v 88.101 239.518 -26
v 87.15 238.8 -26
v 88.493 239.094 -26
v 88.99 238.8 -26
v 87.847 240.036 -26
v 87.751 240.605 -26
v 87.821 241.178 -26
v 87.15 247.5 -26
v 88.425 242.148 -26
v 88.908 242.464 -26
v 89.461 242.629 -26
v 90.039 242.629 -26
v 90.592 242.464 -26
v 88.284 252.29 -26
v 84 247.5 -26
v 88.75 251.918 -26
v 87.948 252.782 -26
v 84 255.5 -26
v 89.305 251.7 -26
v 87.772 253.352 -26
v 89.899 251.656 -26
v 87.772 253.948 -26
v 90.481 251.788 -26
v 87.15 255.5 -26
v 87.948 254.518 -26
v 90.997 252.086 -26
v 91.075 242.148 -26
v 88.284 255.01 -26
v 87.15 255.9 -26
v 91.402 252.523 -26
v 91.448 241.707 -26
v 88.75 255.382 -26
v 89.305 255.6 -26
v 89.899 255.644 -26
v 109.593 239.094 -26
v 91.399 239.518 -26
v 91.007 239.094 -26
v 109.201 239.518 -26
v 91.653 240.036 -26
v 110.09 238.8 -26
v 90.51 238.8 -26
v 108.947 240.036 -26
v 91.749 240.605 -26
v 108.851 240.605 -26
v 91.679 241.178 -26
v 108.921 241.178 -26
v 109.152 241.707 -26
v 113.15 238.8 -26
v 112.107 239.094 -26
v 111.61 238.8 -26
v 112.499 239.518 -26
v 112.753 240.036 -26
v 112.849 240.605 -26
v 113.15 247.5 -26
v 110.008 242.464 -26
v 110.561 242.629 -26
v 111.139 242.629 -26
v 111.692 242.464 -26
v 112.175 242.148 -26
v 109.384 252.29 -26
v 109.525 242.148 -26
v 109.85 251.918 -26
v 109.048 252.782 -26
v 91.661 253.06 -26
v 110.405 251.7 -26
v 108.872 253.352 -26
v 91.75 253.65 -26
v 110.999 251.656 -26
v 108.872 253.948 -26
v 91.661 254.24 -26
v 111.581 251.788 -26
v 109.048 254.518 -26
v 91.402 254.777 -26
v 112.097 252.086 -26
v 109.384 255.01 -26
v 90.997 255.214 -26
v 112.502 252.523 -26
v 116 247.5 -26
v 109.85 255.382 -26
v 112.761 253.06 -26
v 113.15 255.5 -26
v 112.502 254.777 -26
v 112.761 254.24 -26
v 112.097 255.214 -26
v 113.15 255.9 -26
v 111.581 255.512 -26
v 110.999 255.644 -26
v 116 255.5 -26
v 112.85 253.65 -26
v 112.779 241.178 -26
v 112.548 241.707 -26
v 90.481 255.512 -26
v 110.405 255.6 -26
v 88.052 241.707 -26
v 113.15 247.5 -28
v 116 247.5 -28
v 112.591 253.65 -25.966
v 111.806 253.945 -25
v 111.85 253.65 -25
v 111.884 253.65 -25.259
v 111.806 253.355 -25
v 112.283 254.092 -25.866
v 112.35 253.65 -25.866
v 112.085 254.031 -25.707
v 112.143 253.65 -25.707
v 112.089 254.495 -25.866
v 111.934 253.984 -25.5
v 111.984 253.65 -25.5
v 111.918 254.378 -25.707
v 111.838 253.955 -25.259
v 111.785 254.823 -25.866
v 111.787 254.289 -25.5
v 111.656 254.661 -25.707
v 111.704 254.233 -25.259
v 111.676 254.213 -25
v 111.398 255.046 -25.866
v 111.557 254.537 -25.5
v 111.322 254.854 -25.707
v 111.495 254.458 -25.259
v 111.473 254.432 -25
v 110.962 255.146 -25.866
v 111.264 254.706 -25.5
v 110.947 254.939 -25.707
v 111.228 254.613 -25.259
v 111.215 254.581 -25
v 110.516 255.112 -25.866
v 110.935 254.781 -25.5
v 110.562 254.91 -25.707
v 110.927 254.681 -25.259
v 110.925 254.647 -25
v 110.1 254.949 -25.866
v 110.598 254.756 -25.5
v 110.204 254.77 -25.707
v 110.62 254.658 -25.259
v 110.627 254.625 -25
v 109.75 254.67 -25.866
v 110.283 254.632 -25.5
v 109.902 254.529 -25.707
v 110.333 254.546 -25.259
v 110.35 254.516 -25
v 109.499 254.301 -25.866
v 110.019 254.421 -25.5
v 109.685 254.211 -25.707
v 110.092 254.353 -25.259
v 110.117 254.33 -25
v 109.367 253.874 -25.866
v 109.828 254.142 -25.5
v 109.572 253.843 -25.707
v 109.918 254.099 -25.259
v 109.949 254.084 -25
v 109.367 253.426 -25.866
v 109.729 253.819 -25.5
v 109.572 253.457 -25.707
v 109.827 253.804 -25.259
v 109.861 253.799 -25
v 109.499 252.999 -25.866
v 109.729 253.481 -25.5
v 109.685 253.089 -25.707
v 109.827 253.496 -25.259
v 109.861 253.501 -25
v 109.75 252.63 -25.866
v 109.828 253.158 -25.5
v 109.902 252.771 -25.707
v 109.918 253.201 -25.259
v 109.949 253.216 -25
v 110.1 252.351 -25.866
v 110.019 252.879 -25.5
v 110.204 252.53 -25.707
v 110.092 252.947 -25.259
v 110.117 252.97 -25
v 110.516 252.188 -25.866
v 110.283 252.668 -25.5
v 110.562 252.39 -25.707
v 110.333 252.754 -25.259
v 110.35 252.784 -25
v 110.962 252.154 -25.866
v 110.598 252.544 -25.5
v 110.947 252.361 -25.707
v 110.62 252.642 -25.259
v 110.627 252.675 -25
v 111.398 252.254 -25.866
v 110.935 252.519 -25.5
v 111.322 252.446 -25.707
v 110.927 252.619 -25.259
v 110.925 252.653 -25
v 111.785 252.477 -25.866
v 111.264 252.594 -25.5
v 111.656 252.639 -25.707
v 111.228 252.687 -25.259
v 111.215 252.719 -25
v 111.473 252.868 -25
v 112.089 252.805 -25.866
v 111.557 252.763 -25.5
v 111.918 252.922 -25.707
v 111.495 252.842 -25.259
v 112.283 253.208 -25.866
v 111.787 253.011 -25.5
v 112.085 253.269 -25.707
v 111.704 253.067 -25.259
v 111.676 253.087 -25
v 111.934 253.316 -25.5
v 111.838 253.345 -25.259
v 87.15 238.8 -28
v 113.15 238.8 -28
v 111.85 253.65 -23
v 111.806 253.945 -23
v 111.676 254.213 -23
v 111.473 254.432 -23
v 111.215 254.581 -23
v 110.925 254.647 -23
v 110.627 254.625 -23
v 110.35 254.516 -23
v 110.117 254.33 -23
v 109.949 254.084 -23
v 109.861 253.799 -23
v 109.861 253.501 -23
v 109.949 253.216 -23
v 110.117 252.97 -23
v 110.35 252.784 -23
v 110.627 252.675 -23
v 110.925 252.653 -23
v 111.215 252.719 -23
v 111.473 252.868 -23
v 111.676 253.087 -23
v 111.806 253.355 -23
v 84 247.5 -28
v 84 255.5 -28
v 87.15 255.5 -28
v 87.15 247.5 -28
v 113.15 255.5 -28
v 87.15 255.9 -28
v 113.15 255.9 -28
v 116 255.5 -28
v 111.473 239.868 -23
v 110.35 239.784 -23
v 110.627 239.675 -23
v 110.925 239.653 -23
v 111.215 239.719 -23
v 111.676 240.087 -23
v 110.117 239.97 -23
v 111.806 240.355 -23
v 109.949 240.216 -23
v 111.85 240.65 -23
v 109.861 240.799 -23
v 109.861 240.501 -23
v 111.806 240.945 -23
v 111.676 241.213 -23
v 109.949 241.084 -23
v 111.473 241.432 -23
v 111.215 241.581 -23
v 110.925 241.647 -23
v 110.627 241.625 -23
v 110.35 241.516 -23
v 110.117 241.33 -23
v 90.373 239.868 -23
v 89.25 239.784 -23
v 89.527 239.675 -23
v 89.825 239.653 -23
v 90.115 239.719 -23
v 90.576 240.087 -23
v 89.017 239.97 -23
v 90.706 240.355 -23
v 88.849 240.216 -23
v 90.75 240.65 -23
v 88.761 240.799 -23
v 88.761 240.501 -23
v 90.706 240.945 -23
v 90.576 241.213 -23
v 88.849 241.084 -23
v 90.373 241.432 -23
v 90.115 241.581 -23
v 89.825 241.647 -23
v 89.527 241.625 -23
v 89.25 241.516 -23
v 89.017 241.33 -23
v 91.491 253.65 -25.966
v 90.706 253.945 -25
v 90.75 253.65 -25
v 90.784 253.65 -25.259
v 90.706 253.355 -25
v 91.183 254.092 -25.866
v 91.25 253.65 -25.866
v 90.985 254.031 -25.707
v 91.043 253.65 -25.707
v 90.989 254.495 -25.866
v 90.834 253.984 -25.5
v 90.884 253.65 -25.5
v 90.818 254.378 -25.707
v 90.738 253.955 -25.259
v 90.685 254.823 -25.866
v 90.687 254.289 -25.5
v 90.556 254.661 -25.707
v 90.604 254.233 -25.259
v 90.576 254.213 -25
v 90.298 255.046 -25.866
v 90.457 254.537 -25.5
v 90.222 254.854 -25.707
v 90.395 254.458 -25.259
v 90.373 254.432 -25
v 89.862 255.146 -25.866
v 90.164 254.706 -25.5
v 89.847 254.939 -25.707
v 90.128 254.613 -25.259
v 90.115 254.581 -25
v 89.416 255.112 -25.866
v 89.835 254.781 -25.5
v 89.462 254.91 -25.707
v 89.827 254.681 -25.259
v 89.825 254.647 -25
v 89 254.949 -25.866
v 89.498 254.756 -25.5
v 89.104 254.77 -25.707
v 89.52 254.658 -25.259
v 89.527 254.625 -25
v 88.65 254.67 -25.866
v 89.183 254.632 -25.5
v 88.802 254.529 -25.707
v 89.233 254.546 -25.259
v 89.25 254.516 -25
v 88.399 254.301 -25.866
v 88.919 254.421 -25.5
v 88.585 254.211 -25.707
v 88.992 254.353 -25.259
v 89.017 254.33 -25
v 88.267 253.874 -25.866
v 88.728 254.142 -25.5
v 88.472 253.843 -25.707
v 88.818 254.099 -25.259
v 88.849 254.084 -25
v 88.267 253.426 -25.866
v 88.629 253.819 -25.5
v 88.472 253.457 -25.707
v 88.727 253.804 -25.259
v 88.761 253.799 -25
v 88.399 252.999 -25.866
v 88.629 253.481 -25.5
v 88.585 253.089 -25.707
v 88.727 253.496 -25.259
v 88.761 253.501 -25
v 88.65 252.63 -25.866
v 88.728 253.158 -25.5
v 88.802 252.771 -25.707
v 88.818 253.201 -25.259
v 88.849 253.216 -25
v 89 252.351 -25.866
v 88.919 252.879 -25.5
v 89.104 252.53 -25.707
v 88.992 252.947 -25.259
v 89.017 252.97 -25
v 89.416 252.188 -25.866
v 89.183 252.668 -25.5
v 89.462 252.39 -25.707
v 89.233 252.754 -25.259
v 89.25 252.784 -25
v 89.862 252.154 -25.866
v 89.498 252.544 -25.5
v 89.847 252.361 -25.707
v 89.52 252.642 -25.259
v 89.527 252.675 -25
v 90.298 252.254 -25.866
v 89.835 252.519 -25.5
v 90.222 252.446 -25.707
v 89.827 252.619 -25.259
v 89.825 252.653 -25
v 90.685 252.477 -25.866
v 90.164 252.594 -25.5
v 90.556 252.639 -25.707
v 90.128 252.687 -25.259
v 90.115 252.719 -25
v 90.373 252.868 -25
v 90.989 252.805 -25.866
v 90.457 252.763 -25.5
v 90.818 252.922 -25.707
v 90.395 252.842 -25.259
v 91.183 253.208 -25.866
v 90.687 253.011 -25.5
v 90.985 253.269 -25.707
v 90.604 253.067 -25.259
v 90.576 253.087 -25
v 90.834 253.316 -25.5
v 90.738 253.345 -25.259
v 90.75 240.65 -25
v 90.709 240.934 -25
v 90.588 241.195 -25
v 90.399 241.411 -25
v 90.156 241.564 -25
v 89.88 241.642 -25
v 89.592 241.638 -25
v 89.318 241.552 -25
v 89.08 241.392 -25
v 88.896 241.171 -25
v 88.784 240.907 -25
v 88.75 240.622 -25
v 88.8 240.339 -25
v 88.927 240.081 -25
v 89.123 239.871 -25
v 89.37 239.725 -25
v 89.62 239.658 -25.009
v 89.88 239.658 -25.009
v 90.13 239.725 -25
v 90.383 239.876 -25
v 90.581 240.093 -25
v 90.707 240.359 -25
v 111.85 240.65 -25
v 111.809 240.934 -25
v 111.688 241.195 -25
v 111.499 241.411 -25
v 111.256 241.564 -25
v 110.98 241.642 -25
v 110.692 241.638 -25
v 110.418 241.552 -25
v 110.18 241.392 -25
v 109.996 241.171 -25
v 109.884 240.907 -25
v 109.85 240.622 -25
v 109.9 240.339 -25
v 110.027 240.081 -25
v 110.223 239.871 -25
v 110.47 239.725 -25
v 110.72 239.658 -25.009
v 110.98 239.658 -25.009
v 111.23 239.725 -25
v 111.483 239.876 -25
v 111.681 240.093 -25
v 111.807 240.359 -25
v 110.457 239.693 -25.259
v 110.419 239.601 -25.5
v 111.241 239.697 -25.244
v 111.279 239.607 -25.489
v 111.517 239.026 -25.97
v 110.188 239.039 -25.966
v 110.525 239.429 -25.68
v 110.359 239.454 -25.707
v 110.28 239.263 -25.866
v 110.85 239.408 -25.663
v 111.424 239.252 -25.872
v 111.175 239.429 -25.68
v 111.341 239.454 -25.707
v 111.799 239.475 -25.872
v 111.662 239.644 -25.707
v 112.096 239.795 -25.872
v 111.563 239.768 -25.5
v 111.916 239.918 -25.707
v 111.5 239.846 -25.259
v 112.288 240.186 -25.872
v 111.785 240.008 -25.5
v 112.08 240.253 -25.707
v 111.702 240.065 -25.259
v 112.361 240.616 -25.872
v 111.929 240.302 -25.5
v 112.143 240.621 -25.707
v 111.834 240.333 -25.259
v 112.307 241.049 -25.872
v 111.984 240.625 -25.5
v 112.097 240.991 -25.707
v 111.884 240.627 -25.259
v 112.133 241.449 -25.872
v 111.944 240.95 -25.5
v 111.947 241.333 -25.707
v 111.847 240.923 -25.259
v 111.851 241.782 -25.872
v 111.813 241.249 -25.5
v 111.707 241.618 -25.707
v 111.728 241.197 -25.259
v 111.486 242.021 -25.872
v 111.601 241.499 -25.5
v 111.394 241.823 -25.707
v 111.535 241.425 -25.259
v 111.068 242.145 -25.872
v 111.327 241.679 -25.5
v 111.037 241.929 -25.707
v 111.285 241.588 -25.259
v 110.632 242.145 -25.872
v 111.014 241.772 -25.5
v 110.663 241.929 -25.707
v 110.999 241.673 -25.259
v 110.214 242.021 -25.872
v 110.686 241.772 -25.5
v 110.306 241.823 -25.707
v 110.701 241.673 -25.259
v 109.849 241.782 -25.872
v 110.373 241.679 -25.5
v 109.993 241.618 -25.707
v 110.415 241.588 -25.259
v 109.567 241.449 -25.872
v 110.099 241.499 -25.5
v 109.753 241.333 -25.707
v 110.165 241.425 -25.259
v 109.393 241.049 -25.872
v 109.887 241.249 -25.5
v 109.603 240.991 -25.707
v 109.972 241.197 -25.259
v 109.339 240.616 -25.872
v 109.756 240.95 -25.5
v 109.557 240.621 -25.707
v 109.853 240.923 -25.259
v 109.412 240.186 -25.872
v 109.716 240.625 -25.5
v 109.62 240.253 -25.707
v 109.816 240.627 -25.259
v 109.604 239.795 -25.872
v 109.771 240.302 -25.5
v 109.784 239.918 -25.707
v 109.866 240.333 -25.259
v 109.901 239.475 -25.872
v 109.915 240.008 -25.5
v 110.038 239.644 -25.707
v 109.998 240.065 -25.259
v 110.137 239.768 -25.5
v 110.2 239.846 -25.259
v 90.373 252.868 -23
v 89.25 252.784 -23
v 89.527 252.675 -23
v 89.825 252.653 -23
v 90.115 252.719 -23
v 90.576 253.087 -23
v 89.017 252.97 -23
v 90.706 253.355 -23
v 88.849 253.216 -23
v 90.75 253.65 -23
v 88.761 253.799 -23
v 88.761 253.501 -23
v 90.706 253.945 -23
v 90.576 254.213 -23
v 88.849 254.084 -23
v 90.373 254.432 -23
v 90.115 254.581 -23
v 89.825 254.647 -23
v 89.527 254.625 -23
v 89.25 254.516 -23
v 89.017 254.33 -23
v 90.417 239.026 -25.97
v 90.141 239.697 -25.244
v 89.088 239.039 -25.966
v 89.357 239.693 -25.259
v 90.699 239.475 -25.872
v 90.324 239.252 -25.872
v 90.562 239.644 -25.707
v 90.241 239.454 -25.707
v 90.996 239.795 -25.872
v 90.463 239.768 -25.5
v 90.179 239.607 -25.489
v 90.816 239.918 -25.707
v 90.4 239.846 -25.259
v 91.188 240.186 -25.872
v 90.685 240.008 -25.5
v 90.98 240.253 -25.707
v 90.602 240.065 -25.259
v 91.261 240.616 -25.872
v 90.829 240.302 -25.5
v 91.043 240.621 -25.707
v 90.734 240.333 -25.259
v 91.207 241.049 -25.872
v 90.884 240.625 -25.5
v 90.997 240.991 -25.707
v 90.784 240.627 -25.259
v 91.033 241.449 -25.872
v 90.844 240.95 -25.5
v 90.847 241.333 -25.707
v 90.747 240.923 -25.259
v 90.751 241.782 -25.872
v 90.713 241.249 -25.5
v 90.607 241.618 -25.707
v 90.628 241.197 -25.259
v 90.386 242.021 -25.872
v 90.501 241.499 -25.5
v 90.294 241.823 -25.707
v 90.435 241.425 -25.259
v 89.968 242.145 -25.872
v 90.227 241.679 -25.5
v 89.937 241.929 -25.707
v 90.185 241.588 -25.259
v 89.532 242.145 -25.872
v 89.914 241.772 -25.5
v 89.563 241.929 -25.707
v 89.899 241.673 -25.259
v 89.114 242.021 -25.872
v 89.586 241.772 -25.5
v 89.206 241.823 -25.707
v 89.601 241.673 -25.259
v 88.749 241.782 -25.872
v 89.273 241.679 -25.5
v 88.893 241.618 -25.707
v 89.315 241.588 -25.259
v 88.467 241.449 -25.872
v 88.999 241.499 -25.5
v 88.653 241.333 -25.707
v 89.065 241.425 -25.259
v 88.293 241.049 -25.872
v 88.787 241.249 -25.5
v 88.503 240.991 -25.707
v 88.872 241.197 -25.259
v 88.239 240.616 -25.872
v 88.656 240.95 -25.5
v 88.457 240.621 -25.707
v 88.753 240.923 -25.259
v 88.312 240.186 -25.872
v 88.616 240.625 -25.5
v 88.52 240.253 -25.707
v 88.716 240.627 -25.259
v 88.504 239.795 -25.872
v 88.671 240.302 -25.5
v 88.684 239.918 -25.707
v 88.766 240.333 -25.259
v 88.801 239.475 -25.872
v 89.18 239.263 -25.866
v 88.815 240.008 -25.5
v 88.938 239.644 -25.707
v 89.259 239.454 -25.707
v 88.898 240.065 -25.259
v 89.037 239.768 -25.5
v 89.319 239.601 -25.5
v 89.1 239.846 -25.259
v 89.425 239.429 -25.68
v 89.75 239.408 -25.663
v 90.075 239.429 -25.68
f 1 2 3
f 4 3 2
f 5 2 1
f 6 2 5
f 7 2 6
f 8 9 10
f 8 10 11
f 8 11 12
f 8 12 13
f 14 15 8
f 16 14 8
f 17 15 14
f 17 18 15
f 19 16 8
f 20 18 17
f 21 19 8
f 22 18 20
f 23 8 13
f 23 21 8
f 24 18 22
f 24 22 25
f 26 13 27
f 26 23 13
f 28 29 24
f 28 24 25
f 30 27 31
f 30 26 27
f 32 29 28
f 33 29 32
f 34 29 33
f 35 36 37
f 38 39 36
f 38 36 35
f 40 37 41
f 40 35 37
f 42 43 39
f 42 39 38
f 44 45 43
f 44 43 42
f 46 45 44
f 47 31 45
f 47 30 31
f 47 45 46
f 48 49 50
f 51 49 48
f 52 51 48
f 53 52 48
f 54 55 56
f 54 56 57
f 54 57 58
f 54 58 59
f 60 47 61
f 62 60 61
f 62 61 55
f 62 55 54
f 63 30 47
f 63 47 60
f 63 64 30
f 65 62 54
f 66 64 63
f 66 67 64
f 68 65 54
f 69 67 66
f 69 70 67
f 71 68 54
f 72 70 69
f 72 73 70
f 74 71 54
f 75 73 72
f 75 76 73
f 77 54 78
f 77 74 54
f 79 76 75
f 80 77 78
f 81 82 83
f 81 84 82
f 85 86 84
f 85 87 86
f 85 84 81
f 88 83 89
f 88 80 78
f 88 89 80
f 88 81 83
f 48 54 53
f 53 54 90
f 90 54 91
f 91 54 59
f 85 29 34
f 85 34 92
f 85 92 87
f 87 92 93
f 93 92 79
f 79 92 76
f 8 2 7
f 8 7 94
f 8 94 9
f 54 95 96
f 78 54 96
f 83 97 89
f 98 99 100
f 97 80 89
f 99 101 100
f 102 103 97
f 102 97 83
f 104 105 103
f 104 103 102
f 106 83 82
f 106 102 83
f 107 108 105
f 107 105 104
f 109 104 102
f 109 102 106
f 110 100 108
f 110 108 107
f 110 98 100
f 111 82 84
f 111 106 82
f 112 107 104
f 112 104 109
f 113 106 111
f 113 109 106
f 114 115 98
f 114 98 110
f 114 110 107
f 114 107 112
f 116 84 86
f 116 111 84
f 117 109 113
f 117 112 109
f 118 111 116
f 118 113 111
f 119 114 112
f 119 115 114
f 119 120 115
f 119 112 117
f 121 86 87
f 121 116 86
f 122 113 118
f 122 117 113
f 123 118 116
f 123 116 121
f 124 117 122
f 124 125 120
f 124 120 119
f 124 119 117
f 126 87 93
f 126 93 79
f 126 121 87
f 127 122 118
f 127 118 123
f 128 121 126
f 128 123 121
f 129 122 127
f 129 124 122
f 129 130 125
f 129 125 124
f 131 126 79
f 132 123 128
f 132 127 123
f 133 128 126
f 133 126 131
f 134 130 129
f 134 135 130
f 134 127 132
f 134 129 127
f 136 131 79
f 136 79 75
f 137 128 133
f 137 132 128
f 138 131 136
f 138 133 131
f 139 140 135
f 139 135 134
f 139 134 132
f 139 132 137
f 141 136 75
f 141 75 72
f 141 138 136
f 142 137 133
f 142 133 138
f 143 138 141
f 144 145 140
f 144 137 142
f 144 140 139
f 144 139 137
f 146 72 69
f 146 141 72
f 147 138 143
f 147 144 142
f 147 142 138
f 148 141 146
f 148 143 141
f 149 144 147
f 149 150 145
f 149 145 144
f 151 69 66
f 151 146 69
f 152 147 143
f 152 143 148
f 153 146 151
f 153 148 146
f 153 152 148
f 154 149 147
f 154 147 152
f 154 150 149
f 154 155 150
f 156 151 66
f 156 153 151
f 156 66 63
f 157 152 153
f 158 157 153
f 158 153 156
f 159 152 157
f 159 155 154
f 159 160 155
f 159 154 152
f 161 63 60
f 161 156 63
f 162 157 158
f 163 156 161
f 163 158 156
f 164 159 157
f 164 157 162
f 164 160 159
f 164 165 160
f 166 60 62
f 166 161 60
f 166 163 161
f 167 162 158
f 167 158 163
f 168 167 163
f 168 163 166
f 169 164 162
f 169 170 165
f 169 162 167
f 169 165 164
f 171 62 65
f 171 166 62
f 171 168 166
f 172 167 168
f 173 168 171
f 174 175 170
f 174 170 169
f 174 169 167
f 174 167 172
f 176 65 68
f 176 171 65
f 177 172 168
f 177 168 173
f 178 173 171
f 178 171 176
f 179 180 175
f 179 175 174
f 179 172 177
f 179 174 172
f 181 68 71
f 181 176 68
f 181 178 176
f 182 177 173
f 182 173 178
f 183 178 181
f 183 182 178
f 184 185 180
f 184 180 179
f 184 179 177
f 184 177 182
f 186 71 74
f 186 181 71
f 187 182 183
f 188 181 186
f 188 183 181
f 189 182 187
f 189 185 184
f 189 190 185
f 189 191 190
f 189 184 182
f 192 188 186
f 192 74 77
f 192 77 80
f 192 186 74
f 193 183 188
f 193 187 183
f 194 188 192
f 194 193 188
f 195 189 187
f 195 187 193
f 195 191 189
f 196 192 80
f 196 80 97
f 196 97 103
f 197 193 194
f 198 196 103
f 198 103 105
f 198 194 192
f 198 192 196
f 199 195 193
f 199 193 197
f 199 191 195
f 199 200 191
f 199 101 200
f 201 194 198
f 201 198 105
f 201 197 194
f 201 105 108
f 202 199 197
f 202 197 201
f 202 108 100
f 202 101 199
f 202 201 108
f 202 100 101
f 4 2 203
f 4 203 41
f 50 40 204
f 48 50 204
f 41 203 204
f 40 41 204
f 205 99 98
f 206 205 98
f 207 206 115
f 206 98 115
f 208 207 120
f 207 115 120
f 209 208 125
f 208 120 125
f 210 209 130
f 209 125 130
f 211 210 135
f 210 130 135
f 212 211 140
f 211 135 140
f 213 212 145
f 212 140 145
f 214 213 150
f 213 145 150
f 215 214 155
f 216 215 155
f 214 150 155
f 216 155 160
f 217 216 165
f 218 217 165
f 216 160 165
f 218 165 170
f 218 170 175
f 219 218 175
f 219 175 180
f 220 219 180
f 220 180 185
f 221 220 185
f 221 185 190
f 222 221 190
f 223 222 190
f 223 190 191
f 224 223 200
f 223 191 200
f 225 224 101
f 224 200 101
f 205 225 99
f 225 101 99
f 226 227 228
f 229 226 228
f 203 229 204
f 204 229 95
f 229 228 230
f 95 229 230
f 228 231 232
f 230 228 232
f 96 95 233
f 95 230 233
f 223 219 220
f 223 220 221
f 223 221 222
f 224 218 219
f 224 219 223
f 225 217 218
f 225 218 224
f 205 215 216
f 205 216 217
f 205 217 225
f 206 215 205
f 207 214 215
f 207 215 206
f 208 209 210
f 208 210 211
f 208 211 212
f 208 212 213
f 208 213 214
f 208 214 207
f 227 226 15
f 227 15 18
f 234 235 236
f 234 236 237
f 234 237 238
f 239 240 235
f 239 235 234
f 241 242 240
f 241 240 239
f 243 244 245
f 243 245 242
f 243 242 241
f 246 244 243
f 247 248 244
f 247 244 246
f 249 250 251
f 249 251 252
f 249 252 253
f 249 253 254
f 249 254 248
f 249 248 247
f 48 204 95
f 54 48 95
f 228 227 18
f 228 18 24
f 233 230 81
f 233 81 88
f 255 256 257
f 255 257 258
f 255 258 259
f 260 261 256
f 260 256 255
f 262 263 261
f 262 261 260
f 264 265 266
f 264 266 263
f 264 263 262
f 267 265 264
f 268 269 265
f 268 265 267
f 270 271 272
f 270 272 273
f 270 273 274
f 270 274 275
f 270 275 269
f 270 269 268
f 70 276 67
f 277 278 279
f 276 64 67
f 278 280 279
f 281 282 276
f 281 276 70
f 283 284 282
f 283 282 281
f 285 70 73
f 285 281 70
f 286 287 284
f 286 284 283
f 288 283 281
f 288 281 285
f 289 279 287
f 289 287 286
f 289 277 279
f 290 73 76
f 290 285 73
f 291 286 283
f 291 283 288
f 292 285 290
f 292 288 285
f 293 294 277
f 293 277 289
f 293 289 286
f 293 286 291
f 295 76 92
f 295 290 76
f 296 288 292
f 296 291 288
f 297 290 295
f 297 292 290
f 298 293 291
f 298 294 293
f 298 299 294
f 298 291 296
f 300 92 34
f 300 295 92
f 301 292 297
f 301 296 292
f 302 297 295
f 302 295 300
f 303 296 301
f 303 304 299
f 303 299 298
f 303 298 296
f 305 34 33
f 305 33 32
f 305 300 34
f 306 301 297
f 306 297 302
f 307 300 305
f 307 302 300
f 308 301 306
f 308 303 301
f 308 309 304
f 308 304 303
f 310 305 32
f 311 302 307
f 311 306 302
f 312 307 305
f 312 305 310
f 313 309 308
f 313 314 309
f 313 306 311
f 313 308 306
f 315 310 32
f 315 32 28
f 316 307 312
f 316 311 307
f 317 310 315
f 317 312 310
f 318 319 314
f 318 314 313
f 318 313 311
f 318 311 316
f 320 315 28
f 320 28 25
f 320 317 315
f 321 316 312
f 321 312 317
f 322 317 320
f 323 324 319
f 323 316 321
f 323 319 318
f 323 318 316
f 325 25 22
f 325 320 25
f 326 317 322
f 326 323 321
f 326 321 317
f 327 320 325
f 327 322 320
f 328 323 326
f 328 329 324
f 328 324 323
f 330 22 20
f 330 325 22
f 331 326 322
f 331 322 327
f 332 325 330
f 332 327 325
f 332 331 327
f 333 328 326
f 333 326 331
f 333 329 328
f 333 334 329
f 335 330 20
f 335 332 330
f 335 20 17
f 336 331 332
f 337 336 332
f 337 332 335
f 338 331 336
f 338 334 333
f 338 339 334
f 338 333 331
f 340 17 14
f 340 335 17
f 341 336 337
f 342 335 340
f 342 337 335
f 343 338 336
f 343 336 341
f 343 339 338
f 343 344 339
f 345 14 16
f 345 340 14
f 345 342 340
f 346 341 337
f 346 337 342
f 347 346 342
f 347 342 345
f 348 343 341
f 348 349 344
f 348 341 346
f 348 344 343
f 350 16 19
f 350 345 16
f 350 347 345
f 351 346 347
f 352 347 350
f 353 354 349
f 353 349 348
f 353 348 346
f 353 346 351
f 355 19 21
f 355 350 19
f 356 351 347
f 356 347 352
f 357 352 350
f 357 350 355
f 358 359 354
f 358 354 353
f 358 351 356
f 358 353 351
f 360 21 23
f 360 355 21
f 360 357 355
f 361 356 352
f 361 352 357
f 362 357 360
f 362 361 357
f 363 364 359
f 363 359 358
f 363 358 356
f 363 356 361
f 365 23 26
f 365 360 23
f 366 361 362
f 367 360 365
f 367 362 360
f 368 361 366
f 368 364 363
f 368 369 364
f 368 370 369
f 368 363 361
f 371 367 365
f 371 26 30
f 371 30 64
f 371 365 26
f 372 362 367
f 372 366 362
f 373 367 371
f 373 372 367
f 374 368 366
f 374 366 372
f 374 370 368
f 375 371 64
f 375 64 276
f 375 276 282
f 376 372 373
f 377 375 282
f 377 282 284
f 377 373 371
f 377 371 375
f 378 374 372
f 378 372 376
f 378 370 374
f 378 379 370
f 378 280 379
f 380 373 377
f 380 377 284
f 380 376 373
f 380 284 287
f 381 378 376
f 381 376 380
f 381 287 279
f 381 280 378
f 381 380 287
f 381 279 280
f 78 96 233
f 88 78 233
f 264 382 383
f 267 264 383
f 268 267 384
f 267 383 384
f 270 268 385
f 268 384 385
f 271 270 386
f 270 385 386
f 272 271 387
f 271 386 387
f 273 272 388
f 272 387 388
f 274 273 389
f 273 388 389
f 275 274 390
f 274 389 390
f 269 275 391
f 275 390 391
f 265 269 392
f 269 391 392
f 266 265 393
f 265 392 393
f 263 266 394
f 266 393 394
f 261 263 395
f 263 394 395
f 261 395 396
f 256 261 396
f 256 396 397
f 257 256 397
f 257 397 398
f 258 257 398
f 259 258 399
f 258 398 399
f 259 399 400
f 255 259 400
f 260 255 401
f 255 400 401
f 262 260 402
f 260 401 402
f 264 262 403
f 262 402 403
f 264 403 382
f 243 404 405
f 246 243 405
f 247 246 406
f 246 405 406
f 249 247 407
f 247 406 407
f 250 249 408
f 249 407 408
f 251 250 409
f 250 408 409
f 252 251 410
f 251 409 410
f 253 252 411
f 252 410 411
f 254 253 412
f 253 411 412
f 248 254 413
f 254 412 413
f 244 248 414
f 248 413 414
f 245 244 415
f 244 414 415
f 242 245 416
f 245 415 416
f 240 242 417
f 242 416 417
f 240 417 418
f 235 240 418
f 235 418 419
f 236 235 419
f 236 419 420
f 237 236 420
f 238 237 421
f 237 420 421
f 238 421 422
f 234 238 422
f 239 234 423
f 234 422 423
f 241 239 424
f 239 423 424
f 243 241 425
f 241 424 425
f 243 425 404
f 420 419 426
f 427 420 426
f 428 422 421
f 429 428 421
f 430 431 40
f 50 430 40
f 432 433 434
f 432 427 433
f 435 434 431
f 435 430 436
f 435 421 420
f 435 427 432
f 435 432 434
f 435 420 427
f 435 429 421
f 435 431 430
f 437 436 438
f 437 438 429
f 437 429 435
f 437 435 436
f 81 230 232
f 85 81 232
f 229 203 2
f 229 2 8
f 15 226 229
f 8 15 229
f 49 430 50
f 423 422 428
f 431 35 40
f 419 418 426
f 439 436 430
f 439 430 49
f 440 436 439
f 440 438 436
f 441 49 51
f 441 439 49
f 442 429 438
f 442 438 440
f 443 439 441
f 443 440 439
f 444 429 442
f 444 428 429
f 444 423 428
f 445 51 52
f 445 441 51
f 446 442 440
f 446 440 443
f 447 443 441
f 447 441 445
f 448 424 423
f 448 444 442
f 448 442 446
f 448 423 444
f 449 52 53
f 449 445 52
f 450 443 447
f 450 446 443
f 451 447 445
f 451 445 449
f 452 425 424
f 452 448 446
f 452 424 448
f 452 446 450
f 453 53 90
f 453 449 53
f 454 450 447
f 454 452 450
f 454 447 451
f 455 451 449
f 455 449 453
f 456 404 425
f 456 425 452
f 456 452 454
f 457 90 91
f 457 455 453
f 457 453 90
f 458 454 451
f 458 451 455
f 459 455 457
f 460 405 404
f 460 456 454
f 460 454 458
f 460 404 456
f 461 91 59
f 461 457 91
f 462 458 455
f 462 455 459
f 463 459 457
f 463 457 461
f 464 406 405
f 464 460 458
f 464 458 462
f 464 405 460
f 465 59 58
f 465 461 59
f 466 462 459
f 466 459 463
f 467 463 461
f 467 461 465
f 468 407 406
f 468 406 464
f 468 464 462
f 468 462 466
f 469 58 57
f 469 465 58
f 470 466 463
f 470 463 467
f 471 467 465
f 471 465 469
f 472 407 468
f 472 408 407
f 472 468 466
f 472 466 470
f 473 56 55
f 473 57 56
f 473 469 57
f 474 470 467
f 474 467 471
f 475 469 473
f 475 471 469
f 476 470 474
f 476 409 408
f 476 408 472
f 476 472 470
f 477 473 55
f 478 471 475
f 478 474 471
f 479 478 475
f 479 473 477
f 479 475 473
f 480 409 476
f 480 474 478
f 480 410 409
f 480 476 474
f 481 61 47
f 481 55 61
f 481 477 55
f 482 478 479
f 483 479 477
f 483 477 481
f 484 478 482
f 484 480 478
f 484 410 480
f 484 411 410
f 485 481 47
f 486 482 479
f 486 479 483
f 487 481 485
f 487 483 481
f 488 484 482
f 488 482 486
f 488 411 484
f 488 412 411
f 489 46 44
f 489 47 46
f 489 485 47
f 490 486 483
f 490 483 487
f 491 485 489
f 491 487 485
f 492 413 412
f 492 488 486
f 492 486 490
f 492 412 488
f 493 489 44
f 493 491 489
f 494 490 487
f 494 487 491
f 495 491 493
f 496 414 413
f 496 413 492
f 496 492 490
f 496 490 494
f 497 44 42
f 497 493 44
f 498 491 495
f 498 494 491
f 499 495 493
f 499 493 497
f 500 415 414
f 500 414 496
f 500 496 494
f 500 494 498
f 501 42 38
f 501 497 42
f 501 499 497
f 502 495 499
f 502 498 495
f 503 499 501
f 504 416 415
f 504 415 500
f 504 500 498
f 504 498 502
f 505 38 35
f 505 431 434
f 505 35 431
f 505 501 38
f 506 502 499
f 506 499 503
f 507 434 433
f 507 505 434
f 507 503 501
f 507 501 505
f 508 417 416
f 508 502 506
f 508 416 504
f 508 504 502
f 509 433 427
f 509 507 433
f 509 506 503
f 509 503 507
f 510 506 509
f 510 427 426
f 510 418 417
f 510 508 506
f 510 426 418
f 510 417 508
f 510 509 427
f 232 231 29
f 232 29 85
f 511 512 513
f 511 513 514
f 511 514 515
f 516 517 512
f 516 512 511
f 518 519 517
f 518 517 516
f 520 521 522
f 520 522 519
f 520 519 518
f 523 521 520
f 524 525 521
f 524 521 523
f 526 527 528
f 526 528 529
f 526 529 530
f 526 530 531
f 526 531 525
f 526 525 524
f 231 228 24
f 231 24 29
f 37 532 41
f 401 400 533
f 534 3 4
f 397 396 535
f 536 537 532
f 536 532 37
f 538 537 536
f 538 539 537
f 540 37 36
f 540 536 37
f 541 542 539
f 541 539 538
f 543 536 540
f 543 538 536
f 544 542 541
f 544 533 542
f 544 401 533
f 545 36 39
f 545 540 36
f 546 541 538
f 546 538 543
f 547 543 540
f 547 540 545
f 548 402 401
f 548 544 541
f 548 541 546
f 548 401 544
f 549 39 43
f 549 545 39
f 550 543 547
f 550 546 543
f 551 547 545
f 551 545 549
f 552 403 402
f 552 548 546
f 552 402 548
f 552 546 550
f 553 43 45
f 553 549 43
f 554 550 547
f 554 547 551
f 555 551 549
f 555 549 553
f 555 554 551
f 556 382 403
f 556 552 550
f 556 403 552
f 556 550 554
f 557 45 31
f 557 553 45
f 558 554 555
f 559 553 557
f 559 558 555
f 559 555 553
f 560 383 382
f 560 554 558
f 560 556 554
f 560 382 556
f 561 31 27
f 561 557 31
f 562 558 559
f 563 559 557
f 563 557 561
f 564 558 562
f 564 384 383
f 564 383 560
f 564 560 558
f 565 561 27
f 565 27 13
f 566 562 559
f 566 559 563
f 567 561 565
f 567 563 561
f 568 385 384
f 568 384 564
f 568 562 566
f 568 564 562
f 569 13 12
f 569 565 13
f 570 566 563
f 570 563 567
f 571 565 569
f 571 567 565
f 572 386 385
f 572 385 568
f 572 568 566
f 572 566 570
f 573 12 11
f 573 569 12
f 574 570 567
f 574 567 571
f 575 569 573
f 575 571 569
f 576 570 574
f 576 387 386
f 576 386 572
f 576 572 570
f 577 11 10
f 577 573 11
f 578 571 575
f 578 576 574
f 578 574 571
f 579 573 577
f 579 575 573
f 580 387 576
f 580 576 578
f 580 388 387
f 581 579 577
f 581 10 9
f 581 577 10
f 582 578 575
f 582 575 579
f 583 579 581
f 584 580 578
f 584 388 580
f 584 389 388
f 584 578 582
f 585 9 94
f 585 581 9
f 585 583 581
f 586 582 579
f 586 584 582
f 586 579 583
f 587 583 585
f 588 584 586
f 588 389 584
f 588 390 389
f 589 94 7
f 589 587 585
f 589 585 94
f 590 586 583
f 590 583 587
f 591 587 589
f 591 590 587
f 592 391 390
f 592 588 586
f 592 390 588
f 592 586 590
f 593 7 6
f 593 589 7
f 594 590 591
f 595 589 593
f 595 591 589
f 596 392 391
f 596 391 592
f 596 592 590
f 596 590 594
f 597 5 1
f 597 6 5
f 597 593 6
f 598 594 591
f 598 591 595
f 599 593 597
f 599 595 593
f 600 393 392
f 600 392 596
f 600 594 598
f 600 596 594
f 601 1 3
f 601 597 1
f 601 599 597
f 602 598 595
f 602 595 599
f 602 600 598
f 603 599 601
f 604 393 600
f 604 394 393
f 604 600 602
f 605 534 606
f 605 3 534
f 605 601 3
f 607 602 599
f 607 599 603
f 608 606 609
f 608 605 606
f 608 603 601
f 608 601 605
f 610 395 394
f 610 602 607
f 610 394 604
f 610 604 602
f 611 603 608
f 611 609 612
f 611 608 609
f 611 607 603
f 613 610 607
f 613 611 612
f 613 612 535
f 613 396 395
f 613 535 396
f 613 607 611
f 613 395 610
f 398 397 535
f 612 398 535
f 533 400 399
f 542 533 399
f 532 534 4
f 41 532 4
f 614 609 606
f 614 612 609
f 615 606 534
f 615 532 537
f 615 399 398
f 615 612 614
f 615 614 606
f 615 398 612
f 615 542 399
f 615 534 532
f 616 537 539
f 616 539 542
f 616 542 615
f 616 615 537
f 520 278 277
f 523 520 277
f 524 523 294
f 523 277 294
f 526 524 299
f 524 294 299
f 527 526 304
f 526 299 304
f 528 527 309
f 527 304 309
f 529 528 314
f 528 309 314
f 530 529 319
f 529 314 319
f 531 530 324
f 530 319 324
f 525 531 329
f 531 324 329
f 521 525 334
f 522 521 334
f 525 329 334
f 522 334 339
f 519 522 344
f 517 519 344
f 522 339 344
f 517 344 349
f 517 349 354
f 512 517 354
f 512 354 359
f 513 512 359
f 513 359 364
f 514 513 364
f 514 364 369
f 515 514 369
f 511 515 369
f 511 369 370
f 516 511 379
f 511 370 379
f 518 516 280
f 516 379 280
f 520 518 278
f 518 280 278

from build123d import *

# Parameters (mm, degrees)
CYLINDER015_R     = 1
CYLINDER015_DEPTH = 3
CYLINDER014_R     = 1
CYLINDER014_DEPTH = 3
CYLINDER013_R     = 1
CYLINDER013_DEPTH = 3
CYLINDER016_R     = 1
CYLINDER016_DEPTH = 3
BOX004_W          = 26
BOX004_H          = 17.1
BOX004_DEPTH      = 2
BOX005_W          = 32
BOX005_H          = 8
BOX005_DEPTH      = 2
FILLET003_R       = 1


with BuildPart() as cilindro015:
    # Cylinder015 → Cylinder015 (new body)
    with BuildSketch(Plane(origin=(89.75, 253.65, 4), x_dir=(1, 0, 0), z_dir=(0, 0, 1))):
        Circle(CYLINDER015_R)
    extrude(amount=CYLINDER015_DEPTH)


with BuildPart() as cilindro014:
    # Cylinder014 → Cylinder014 (new body)
    with BuildSketch(Plane(origin=(89.75, 240.65, 4), x_dir=(1, 0, 0), z_dir=(0, 0, 1))):
        Circle(CYLINDER014_R)
    extrude(amount=CYLINDER014_DEPTH)


with BuildPart() as cilindro013:
    # Cylinder013 → Cylinder013 (new body)
    with BuildSketch(Plane(origin=(110.85, 240.65, 4), x_dir=(1, 0, 0), z_dir=(0, 0, 1))):
        Circle(CYLINDER013_R)
    extrude(amount=CYLINDER013_DEPTH)


with BuildPart() as fusion011:
    # Cylinder016 → Cylinder016 (new body)
    with BuildSketch(Plane(origin=(110.85, 253.65, 4), x_dir=(1, 0, 0), z_dir=(0, 0, 1))):
        Circle(CYLINDER016_R)
    extrude(amount=CYLINDER016_DEPTH)

    # Fusion011: union Cilindro015, Cilindro014, Cilindro013
    add(cilindro015.part)
    add(cilindro014.part)
    add(cilindro013.part)


with BuildPart() as fusion011_1:
    # Fusion011 placement: moved
    add(fusion011.part.moved(Location((0, 0, -4))))


with BuildPart() as cubo004:
    # Box004 → Box004 (new body)
    with BuildSketch(Plane(origin=(87.15, 238.8, -2), x_dir=(1, 0, 0), z_dir=(0, 0, 1))):
        with Locations((13, 8.55)):
            Rectangle(BOX004_W, BOX004_H)
    extrude(amount=BOX004_DEPTH)


with BuildPart() as tapa:
    # Box005 → Box005 (new body)
    with BuildSketch(Plane(origin=(84, 247.5, -2), x_dir=(1, 0, 0), z_dir=(0, 0, 1))):
        with Locations((16, 4)):
            Rectangle(BOX005_W, BOX005_H)
    extrude(amount=BOX005_DEPTH)

    # Fusion016: union Cubo004
    add(cubo004.part)

    # Fusion017: union Fusion011
    add(fusion011_1.part)


with BuildPart() as tapa_1:
    # Fusion017 placement: moved
    add(tapa.part.moved(Location((0, 0, -26))))

    # Fillet003
    fillet003_edges = [tapa_1.edges().sort_by_distance(p)[0] for p in [
        (109.85, 253.65, -26),
        (109.85, 240.65, -26),
        (88.75, 240.65, -26),
        (88.75, 253.65, -26),
    ]]
    fillet(fillet003_edges, radius=FILLET003_R)


solid = tapa_1.part
